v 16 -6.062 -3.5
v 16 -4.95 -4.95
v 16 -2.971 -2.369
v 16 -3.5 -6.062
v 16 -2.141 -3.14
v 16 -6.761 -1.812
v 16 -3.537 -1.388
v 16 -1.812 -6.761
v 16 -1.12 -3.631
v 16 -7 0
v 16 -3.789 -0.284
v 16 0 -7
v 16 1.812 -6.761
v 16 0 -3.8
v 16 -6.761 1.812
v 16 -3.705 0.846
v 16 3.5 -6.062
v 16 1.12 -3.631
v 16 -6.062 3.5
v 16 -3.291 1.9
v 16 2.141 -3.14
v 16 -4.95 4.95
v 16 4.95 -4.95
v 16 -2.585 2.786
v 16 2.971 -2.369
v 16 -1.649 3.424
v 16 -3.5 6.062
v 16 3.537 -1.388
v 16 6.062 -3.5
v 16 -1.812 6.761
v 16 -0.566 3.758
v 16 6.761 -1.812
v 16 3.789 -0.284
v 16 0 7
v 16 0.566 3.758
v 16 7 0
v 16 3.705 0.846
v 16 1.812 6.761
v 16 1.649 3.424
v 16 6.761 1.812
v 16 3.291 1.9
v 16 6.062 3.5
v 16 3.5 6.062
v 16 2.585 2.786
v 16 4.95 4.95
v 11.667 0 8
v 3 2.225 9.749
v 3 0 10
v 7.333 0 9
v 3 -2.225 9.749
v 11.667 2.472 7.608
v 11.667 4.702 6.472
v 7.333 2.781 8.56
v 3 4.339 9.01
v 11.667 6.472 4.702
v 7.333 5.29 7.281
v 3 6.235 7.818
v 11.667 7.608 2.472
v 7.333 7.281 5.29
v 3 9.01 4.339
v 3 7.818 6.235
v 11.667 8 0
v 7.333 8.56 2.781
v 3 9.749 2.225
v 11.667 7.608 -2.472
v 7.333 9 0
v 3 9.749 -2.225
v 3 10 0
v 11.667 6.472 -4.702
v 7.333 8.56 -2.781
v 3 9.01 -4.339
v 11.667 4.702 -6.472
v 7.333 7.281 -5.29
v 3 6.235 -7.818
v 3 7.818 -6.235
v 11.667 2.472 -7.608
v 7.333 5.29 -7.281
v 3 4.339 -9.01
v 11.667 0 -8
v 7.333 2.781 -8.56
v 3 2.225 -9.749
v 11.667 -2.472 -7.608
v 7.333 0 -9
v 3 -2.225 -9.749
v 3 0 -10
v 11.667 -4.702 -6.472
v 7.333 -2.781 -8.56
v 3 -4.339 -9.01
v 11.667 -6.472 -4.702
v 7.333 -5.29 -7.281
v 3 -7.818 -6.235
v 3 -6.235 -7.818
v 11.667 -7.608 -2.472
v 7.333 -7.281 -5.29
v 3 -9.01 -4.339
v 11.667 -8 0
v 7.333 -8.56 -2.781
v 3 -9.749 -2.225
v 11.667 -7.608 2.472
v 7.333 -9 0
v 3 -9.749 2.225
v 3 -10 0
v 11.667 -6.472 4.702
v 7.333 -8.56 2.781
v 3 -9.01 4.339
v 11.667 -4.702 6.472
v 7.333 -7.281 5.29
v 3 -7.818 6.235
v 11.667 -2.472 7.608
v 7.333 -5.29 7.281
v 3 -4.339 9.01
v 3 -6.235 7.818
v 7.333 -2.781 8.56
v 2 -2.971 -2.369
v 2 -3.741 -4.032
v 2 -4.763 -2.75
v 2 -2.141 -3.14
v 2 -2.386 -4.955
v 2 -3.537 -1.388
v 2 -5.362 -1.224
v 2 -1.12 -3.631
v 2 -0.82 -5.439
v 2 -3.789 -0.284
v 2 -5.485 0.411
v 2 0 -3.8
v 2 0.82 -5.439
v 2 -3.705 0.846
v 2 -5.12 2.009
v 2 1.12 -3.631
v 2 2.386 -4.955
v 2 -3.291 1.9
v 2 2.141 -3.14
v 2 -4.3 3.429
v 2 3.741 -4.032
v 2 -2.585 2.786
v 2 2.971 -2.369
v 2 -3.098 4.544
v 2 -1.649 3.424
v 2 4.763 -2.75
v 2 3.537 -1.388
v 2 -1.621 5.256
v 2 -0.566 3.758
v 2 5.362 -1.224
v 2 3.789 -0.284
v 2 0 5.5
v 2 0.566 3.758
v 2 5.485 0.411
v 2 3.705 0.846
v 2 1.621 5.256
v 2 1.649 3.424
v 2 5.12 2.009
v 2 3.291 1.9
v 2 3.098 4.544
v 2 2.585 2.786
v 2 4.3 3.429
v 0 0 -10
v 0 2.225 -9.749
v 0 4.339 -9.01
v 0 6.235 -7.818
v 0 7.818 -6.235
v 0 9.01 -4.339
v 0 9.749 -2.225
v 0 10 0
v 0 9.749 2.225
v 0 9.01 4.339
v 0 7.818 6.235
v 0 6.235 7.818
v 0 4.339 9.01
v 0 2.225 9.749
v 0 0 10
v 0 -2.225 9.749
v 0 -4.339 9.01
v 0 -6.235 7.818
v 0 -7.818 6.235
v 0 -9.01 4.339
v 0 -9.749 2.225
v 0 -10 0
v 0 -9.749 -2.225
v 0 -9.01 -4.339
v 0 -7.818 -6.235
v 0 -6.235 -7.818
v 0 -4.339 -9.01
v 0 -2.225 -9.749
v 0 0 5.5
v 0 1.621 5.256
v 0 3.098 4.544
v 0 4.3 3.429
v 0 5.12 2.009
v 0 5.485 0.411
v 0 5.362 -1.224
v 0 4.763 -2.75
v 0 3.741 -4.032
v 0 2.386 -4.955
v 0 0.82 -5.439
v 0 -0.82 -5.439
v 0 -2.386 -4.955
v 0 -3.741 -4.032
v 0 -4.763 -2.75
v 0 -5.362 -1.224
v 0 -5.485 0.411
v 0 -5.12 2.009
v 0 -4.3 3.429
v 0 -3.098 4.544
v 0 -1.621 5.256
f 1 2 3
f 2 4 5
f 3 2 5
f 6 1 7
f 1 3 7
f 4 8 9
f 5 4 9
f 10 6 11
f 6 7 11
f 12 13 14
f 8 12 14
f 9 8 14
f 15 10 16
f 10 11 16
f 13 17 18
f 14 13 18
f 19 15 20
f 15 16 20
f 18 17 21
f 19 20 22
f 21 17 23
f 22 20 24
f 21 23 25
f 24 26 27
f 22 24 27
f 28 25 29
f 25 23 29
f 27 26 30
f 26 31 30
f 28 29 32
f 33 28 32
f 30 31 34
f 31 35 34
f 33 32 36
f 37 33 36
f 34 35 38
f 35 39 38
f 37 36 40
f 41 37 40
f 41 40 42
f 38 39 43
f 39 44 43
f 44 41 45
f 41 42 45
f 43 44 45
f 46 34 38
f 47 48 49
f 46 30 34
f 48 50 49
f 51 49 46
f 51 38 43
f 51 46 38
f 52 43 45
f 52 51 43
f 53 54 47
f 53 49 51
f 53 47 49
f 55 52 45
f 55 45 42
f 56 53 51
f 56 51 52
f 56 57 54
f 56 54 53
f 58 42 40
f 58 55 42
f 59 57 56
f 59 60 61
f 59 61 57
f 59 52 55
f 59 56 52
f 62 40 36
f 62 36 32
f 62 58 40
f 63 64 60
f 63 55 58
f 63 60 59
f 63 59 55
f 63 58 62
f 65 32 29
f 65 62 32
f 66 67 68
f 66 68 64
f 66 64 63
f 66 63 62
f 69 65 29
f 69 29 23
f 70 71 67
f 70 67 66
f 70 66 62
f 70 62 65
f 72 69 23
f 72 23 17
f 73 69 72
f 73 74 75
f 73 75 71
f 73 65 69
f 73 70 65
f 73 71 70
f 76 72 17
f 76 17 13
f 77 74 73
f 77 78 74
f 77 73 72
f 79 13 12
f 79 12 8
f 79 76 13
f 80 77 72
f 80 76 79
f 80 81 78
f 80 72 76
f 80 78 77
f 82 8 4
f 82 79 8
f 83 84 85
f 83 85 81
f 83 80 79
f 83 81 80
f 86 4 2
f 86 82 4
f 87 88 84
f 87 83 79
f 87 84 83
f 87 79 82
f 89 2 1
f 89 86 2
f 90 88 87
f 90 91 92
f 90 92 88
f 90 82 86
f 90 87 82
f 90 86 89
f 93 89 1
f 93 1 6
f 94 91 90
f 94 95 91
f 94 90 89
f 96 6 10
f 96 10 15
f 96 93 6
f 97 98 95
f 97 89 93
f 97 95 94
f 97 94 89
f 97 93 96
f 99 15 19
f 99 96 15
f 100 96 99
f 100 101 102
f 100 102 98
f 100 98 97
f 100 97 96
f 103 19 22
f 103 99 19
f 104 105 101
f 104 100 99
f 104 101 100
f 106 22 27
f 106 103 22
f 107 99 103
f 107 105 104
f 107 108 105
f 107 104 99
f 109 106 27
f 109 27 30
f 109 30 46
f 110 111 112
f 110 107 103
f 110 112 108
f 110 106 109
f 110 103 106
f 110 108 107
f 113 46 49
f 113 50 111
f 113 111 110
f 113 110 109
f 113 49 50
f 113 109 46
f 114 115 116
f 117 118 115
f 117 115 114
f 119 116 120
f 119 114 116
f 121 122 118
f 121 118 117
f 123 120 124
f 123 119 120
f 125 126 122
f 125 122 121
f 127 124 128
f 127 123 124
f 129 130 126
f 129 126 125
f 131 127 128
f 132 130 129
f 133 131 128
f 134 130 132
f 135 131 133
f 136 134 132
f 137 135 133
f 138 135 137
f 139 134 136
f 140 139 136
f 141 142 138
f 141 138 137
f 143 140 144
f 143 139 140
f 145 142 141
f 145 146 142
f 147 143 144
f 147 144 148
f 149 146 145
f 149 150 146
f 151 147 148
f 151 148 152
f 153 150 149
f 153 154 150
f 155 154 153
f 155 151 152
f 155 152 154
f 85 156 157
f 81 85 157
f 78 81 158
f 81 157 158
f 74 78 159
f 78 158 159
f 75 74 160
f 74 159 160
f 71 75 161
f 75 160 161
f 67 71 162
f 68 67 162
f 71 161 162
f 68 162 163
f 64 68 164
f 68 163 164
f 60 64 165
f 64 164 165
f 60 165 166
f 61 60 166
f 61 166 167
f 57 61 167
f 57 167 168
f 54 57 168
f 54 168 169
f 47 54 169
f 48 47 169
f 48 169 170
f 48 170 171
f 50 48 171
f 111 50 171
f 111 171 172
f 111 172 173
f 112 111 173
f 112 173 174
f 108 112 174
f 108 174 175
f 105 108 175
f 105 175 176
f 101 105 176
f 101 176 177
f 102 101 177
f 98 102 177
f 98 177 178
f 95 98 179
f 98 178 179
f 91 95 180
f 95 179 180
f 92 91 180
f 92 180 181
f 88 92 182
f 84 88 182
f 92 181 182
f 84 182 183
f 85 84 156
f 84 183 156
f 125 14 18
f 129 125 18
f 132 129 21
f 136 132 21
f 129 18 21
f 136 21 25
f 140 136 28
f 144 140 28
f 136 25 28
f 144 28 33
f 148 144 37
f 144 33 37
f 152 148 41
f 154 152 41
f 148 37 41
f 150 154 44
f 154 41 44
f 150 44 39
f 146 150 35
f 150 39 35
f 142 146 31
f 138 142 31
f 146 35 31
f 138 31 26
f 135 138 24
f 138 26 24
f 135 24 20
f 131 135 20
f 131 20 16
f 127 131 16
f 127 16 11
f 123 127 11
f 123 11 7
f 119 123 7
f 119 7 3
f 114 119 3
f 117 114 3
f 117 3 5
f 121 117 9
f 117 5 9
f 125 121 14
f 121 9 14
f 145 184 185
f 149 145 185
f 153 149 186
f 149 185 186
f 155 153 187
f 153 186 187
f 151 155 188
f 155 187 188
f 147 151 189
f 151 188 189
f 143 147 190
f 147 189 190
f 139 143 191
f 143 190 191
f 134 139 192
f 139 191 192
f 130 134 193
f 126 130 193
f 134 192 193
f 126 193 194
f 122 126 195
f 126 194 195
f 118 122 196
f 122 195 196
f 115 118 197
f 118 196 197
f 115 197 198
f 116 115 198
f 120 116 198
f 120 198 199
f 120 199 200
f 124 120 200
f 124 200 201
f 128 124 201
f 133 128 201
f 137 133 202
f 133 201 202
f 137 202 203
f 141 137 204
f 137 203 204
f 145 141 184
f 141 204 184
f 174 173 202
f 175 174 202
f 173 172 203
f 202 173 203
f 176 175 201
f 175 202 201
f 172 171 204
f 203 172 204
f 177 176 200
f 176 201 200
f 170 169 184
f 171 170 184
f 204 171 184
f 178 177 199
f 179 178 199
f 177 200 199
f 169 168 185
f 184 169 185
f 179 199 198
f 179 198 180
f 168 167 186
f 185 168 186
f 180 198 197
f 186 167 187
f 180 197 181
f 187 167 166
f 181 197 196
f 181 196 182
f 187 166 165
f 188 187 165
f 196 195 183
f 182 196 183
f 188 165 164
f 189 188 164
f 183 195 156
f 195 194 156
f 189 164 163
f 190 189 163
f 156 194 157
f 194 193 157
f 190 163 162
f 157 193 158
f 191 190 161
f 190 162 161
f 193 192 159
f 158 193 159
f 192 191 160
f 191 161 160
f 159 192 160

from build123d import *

# Parameters (mm, degrees)
SKETCH1_R           = 10
BOSS_EXTRUDE1_DEPTH = 3
SKETCH2_R           = 5.5
CUT_EXTRUDE1_DEPTH  = 2
SKETCH3_R           = 7
SKETCH4_R           = 3.8
CUT_EXTRUDE2_DEPTH  = 14


with BuildPart() as part:
    # Sketch1 → Boss-Extrude1 (new body)
    with BuildSketch(Plane(origin=(0, 0, 0), x_dir=(0, 0, -1), z_dir=(1, 0, 0))):
        Circle(SKETCH1_R)
    extrude(amount=BOSS_EXTRUDE1_DEPTH)

    # Sketch2 → Cut-Extrude1 (cut)
    with BuildSketch(Plane.ZY):
        Circle(SKETCH2_R)
    extrude(amount=-CUT_EXTRUDE1_DEPTH, mode=Mode.SUBTRACT)

    # Sketch3 → section 0 of loft1
    with BuildSketch(Plane.ZY.offset(-16), mode=Mode.PRIVATE) as loft1_s0:
        Circle(SKETCH3_R)
    # loft up to a face of the part (loft1)
    loft([loft1_s0.sketch, Face(Wire([part.edges().sort_by_distance((3, 7.289686274, 6.845471059))[0]]))])

    # Sketch4 → Cut-Extrude2 (cut)
    with BuildSketch(Plane(origin=(16, 0, 0), x_dir=(0, 0, -1), z_dir=(1, 0, 0))):
        Circle(SKETCH4_R)
    extrude(amount=-CUT_EXTRUDE2_DEPTH, mode=Mode.SUBTRACT)


solid = part.part
